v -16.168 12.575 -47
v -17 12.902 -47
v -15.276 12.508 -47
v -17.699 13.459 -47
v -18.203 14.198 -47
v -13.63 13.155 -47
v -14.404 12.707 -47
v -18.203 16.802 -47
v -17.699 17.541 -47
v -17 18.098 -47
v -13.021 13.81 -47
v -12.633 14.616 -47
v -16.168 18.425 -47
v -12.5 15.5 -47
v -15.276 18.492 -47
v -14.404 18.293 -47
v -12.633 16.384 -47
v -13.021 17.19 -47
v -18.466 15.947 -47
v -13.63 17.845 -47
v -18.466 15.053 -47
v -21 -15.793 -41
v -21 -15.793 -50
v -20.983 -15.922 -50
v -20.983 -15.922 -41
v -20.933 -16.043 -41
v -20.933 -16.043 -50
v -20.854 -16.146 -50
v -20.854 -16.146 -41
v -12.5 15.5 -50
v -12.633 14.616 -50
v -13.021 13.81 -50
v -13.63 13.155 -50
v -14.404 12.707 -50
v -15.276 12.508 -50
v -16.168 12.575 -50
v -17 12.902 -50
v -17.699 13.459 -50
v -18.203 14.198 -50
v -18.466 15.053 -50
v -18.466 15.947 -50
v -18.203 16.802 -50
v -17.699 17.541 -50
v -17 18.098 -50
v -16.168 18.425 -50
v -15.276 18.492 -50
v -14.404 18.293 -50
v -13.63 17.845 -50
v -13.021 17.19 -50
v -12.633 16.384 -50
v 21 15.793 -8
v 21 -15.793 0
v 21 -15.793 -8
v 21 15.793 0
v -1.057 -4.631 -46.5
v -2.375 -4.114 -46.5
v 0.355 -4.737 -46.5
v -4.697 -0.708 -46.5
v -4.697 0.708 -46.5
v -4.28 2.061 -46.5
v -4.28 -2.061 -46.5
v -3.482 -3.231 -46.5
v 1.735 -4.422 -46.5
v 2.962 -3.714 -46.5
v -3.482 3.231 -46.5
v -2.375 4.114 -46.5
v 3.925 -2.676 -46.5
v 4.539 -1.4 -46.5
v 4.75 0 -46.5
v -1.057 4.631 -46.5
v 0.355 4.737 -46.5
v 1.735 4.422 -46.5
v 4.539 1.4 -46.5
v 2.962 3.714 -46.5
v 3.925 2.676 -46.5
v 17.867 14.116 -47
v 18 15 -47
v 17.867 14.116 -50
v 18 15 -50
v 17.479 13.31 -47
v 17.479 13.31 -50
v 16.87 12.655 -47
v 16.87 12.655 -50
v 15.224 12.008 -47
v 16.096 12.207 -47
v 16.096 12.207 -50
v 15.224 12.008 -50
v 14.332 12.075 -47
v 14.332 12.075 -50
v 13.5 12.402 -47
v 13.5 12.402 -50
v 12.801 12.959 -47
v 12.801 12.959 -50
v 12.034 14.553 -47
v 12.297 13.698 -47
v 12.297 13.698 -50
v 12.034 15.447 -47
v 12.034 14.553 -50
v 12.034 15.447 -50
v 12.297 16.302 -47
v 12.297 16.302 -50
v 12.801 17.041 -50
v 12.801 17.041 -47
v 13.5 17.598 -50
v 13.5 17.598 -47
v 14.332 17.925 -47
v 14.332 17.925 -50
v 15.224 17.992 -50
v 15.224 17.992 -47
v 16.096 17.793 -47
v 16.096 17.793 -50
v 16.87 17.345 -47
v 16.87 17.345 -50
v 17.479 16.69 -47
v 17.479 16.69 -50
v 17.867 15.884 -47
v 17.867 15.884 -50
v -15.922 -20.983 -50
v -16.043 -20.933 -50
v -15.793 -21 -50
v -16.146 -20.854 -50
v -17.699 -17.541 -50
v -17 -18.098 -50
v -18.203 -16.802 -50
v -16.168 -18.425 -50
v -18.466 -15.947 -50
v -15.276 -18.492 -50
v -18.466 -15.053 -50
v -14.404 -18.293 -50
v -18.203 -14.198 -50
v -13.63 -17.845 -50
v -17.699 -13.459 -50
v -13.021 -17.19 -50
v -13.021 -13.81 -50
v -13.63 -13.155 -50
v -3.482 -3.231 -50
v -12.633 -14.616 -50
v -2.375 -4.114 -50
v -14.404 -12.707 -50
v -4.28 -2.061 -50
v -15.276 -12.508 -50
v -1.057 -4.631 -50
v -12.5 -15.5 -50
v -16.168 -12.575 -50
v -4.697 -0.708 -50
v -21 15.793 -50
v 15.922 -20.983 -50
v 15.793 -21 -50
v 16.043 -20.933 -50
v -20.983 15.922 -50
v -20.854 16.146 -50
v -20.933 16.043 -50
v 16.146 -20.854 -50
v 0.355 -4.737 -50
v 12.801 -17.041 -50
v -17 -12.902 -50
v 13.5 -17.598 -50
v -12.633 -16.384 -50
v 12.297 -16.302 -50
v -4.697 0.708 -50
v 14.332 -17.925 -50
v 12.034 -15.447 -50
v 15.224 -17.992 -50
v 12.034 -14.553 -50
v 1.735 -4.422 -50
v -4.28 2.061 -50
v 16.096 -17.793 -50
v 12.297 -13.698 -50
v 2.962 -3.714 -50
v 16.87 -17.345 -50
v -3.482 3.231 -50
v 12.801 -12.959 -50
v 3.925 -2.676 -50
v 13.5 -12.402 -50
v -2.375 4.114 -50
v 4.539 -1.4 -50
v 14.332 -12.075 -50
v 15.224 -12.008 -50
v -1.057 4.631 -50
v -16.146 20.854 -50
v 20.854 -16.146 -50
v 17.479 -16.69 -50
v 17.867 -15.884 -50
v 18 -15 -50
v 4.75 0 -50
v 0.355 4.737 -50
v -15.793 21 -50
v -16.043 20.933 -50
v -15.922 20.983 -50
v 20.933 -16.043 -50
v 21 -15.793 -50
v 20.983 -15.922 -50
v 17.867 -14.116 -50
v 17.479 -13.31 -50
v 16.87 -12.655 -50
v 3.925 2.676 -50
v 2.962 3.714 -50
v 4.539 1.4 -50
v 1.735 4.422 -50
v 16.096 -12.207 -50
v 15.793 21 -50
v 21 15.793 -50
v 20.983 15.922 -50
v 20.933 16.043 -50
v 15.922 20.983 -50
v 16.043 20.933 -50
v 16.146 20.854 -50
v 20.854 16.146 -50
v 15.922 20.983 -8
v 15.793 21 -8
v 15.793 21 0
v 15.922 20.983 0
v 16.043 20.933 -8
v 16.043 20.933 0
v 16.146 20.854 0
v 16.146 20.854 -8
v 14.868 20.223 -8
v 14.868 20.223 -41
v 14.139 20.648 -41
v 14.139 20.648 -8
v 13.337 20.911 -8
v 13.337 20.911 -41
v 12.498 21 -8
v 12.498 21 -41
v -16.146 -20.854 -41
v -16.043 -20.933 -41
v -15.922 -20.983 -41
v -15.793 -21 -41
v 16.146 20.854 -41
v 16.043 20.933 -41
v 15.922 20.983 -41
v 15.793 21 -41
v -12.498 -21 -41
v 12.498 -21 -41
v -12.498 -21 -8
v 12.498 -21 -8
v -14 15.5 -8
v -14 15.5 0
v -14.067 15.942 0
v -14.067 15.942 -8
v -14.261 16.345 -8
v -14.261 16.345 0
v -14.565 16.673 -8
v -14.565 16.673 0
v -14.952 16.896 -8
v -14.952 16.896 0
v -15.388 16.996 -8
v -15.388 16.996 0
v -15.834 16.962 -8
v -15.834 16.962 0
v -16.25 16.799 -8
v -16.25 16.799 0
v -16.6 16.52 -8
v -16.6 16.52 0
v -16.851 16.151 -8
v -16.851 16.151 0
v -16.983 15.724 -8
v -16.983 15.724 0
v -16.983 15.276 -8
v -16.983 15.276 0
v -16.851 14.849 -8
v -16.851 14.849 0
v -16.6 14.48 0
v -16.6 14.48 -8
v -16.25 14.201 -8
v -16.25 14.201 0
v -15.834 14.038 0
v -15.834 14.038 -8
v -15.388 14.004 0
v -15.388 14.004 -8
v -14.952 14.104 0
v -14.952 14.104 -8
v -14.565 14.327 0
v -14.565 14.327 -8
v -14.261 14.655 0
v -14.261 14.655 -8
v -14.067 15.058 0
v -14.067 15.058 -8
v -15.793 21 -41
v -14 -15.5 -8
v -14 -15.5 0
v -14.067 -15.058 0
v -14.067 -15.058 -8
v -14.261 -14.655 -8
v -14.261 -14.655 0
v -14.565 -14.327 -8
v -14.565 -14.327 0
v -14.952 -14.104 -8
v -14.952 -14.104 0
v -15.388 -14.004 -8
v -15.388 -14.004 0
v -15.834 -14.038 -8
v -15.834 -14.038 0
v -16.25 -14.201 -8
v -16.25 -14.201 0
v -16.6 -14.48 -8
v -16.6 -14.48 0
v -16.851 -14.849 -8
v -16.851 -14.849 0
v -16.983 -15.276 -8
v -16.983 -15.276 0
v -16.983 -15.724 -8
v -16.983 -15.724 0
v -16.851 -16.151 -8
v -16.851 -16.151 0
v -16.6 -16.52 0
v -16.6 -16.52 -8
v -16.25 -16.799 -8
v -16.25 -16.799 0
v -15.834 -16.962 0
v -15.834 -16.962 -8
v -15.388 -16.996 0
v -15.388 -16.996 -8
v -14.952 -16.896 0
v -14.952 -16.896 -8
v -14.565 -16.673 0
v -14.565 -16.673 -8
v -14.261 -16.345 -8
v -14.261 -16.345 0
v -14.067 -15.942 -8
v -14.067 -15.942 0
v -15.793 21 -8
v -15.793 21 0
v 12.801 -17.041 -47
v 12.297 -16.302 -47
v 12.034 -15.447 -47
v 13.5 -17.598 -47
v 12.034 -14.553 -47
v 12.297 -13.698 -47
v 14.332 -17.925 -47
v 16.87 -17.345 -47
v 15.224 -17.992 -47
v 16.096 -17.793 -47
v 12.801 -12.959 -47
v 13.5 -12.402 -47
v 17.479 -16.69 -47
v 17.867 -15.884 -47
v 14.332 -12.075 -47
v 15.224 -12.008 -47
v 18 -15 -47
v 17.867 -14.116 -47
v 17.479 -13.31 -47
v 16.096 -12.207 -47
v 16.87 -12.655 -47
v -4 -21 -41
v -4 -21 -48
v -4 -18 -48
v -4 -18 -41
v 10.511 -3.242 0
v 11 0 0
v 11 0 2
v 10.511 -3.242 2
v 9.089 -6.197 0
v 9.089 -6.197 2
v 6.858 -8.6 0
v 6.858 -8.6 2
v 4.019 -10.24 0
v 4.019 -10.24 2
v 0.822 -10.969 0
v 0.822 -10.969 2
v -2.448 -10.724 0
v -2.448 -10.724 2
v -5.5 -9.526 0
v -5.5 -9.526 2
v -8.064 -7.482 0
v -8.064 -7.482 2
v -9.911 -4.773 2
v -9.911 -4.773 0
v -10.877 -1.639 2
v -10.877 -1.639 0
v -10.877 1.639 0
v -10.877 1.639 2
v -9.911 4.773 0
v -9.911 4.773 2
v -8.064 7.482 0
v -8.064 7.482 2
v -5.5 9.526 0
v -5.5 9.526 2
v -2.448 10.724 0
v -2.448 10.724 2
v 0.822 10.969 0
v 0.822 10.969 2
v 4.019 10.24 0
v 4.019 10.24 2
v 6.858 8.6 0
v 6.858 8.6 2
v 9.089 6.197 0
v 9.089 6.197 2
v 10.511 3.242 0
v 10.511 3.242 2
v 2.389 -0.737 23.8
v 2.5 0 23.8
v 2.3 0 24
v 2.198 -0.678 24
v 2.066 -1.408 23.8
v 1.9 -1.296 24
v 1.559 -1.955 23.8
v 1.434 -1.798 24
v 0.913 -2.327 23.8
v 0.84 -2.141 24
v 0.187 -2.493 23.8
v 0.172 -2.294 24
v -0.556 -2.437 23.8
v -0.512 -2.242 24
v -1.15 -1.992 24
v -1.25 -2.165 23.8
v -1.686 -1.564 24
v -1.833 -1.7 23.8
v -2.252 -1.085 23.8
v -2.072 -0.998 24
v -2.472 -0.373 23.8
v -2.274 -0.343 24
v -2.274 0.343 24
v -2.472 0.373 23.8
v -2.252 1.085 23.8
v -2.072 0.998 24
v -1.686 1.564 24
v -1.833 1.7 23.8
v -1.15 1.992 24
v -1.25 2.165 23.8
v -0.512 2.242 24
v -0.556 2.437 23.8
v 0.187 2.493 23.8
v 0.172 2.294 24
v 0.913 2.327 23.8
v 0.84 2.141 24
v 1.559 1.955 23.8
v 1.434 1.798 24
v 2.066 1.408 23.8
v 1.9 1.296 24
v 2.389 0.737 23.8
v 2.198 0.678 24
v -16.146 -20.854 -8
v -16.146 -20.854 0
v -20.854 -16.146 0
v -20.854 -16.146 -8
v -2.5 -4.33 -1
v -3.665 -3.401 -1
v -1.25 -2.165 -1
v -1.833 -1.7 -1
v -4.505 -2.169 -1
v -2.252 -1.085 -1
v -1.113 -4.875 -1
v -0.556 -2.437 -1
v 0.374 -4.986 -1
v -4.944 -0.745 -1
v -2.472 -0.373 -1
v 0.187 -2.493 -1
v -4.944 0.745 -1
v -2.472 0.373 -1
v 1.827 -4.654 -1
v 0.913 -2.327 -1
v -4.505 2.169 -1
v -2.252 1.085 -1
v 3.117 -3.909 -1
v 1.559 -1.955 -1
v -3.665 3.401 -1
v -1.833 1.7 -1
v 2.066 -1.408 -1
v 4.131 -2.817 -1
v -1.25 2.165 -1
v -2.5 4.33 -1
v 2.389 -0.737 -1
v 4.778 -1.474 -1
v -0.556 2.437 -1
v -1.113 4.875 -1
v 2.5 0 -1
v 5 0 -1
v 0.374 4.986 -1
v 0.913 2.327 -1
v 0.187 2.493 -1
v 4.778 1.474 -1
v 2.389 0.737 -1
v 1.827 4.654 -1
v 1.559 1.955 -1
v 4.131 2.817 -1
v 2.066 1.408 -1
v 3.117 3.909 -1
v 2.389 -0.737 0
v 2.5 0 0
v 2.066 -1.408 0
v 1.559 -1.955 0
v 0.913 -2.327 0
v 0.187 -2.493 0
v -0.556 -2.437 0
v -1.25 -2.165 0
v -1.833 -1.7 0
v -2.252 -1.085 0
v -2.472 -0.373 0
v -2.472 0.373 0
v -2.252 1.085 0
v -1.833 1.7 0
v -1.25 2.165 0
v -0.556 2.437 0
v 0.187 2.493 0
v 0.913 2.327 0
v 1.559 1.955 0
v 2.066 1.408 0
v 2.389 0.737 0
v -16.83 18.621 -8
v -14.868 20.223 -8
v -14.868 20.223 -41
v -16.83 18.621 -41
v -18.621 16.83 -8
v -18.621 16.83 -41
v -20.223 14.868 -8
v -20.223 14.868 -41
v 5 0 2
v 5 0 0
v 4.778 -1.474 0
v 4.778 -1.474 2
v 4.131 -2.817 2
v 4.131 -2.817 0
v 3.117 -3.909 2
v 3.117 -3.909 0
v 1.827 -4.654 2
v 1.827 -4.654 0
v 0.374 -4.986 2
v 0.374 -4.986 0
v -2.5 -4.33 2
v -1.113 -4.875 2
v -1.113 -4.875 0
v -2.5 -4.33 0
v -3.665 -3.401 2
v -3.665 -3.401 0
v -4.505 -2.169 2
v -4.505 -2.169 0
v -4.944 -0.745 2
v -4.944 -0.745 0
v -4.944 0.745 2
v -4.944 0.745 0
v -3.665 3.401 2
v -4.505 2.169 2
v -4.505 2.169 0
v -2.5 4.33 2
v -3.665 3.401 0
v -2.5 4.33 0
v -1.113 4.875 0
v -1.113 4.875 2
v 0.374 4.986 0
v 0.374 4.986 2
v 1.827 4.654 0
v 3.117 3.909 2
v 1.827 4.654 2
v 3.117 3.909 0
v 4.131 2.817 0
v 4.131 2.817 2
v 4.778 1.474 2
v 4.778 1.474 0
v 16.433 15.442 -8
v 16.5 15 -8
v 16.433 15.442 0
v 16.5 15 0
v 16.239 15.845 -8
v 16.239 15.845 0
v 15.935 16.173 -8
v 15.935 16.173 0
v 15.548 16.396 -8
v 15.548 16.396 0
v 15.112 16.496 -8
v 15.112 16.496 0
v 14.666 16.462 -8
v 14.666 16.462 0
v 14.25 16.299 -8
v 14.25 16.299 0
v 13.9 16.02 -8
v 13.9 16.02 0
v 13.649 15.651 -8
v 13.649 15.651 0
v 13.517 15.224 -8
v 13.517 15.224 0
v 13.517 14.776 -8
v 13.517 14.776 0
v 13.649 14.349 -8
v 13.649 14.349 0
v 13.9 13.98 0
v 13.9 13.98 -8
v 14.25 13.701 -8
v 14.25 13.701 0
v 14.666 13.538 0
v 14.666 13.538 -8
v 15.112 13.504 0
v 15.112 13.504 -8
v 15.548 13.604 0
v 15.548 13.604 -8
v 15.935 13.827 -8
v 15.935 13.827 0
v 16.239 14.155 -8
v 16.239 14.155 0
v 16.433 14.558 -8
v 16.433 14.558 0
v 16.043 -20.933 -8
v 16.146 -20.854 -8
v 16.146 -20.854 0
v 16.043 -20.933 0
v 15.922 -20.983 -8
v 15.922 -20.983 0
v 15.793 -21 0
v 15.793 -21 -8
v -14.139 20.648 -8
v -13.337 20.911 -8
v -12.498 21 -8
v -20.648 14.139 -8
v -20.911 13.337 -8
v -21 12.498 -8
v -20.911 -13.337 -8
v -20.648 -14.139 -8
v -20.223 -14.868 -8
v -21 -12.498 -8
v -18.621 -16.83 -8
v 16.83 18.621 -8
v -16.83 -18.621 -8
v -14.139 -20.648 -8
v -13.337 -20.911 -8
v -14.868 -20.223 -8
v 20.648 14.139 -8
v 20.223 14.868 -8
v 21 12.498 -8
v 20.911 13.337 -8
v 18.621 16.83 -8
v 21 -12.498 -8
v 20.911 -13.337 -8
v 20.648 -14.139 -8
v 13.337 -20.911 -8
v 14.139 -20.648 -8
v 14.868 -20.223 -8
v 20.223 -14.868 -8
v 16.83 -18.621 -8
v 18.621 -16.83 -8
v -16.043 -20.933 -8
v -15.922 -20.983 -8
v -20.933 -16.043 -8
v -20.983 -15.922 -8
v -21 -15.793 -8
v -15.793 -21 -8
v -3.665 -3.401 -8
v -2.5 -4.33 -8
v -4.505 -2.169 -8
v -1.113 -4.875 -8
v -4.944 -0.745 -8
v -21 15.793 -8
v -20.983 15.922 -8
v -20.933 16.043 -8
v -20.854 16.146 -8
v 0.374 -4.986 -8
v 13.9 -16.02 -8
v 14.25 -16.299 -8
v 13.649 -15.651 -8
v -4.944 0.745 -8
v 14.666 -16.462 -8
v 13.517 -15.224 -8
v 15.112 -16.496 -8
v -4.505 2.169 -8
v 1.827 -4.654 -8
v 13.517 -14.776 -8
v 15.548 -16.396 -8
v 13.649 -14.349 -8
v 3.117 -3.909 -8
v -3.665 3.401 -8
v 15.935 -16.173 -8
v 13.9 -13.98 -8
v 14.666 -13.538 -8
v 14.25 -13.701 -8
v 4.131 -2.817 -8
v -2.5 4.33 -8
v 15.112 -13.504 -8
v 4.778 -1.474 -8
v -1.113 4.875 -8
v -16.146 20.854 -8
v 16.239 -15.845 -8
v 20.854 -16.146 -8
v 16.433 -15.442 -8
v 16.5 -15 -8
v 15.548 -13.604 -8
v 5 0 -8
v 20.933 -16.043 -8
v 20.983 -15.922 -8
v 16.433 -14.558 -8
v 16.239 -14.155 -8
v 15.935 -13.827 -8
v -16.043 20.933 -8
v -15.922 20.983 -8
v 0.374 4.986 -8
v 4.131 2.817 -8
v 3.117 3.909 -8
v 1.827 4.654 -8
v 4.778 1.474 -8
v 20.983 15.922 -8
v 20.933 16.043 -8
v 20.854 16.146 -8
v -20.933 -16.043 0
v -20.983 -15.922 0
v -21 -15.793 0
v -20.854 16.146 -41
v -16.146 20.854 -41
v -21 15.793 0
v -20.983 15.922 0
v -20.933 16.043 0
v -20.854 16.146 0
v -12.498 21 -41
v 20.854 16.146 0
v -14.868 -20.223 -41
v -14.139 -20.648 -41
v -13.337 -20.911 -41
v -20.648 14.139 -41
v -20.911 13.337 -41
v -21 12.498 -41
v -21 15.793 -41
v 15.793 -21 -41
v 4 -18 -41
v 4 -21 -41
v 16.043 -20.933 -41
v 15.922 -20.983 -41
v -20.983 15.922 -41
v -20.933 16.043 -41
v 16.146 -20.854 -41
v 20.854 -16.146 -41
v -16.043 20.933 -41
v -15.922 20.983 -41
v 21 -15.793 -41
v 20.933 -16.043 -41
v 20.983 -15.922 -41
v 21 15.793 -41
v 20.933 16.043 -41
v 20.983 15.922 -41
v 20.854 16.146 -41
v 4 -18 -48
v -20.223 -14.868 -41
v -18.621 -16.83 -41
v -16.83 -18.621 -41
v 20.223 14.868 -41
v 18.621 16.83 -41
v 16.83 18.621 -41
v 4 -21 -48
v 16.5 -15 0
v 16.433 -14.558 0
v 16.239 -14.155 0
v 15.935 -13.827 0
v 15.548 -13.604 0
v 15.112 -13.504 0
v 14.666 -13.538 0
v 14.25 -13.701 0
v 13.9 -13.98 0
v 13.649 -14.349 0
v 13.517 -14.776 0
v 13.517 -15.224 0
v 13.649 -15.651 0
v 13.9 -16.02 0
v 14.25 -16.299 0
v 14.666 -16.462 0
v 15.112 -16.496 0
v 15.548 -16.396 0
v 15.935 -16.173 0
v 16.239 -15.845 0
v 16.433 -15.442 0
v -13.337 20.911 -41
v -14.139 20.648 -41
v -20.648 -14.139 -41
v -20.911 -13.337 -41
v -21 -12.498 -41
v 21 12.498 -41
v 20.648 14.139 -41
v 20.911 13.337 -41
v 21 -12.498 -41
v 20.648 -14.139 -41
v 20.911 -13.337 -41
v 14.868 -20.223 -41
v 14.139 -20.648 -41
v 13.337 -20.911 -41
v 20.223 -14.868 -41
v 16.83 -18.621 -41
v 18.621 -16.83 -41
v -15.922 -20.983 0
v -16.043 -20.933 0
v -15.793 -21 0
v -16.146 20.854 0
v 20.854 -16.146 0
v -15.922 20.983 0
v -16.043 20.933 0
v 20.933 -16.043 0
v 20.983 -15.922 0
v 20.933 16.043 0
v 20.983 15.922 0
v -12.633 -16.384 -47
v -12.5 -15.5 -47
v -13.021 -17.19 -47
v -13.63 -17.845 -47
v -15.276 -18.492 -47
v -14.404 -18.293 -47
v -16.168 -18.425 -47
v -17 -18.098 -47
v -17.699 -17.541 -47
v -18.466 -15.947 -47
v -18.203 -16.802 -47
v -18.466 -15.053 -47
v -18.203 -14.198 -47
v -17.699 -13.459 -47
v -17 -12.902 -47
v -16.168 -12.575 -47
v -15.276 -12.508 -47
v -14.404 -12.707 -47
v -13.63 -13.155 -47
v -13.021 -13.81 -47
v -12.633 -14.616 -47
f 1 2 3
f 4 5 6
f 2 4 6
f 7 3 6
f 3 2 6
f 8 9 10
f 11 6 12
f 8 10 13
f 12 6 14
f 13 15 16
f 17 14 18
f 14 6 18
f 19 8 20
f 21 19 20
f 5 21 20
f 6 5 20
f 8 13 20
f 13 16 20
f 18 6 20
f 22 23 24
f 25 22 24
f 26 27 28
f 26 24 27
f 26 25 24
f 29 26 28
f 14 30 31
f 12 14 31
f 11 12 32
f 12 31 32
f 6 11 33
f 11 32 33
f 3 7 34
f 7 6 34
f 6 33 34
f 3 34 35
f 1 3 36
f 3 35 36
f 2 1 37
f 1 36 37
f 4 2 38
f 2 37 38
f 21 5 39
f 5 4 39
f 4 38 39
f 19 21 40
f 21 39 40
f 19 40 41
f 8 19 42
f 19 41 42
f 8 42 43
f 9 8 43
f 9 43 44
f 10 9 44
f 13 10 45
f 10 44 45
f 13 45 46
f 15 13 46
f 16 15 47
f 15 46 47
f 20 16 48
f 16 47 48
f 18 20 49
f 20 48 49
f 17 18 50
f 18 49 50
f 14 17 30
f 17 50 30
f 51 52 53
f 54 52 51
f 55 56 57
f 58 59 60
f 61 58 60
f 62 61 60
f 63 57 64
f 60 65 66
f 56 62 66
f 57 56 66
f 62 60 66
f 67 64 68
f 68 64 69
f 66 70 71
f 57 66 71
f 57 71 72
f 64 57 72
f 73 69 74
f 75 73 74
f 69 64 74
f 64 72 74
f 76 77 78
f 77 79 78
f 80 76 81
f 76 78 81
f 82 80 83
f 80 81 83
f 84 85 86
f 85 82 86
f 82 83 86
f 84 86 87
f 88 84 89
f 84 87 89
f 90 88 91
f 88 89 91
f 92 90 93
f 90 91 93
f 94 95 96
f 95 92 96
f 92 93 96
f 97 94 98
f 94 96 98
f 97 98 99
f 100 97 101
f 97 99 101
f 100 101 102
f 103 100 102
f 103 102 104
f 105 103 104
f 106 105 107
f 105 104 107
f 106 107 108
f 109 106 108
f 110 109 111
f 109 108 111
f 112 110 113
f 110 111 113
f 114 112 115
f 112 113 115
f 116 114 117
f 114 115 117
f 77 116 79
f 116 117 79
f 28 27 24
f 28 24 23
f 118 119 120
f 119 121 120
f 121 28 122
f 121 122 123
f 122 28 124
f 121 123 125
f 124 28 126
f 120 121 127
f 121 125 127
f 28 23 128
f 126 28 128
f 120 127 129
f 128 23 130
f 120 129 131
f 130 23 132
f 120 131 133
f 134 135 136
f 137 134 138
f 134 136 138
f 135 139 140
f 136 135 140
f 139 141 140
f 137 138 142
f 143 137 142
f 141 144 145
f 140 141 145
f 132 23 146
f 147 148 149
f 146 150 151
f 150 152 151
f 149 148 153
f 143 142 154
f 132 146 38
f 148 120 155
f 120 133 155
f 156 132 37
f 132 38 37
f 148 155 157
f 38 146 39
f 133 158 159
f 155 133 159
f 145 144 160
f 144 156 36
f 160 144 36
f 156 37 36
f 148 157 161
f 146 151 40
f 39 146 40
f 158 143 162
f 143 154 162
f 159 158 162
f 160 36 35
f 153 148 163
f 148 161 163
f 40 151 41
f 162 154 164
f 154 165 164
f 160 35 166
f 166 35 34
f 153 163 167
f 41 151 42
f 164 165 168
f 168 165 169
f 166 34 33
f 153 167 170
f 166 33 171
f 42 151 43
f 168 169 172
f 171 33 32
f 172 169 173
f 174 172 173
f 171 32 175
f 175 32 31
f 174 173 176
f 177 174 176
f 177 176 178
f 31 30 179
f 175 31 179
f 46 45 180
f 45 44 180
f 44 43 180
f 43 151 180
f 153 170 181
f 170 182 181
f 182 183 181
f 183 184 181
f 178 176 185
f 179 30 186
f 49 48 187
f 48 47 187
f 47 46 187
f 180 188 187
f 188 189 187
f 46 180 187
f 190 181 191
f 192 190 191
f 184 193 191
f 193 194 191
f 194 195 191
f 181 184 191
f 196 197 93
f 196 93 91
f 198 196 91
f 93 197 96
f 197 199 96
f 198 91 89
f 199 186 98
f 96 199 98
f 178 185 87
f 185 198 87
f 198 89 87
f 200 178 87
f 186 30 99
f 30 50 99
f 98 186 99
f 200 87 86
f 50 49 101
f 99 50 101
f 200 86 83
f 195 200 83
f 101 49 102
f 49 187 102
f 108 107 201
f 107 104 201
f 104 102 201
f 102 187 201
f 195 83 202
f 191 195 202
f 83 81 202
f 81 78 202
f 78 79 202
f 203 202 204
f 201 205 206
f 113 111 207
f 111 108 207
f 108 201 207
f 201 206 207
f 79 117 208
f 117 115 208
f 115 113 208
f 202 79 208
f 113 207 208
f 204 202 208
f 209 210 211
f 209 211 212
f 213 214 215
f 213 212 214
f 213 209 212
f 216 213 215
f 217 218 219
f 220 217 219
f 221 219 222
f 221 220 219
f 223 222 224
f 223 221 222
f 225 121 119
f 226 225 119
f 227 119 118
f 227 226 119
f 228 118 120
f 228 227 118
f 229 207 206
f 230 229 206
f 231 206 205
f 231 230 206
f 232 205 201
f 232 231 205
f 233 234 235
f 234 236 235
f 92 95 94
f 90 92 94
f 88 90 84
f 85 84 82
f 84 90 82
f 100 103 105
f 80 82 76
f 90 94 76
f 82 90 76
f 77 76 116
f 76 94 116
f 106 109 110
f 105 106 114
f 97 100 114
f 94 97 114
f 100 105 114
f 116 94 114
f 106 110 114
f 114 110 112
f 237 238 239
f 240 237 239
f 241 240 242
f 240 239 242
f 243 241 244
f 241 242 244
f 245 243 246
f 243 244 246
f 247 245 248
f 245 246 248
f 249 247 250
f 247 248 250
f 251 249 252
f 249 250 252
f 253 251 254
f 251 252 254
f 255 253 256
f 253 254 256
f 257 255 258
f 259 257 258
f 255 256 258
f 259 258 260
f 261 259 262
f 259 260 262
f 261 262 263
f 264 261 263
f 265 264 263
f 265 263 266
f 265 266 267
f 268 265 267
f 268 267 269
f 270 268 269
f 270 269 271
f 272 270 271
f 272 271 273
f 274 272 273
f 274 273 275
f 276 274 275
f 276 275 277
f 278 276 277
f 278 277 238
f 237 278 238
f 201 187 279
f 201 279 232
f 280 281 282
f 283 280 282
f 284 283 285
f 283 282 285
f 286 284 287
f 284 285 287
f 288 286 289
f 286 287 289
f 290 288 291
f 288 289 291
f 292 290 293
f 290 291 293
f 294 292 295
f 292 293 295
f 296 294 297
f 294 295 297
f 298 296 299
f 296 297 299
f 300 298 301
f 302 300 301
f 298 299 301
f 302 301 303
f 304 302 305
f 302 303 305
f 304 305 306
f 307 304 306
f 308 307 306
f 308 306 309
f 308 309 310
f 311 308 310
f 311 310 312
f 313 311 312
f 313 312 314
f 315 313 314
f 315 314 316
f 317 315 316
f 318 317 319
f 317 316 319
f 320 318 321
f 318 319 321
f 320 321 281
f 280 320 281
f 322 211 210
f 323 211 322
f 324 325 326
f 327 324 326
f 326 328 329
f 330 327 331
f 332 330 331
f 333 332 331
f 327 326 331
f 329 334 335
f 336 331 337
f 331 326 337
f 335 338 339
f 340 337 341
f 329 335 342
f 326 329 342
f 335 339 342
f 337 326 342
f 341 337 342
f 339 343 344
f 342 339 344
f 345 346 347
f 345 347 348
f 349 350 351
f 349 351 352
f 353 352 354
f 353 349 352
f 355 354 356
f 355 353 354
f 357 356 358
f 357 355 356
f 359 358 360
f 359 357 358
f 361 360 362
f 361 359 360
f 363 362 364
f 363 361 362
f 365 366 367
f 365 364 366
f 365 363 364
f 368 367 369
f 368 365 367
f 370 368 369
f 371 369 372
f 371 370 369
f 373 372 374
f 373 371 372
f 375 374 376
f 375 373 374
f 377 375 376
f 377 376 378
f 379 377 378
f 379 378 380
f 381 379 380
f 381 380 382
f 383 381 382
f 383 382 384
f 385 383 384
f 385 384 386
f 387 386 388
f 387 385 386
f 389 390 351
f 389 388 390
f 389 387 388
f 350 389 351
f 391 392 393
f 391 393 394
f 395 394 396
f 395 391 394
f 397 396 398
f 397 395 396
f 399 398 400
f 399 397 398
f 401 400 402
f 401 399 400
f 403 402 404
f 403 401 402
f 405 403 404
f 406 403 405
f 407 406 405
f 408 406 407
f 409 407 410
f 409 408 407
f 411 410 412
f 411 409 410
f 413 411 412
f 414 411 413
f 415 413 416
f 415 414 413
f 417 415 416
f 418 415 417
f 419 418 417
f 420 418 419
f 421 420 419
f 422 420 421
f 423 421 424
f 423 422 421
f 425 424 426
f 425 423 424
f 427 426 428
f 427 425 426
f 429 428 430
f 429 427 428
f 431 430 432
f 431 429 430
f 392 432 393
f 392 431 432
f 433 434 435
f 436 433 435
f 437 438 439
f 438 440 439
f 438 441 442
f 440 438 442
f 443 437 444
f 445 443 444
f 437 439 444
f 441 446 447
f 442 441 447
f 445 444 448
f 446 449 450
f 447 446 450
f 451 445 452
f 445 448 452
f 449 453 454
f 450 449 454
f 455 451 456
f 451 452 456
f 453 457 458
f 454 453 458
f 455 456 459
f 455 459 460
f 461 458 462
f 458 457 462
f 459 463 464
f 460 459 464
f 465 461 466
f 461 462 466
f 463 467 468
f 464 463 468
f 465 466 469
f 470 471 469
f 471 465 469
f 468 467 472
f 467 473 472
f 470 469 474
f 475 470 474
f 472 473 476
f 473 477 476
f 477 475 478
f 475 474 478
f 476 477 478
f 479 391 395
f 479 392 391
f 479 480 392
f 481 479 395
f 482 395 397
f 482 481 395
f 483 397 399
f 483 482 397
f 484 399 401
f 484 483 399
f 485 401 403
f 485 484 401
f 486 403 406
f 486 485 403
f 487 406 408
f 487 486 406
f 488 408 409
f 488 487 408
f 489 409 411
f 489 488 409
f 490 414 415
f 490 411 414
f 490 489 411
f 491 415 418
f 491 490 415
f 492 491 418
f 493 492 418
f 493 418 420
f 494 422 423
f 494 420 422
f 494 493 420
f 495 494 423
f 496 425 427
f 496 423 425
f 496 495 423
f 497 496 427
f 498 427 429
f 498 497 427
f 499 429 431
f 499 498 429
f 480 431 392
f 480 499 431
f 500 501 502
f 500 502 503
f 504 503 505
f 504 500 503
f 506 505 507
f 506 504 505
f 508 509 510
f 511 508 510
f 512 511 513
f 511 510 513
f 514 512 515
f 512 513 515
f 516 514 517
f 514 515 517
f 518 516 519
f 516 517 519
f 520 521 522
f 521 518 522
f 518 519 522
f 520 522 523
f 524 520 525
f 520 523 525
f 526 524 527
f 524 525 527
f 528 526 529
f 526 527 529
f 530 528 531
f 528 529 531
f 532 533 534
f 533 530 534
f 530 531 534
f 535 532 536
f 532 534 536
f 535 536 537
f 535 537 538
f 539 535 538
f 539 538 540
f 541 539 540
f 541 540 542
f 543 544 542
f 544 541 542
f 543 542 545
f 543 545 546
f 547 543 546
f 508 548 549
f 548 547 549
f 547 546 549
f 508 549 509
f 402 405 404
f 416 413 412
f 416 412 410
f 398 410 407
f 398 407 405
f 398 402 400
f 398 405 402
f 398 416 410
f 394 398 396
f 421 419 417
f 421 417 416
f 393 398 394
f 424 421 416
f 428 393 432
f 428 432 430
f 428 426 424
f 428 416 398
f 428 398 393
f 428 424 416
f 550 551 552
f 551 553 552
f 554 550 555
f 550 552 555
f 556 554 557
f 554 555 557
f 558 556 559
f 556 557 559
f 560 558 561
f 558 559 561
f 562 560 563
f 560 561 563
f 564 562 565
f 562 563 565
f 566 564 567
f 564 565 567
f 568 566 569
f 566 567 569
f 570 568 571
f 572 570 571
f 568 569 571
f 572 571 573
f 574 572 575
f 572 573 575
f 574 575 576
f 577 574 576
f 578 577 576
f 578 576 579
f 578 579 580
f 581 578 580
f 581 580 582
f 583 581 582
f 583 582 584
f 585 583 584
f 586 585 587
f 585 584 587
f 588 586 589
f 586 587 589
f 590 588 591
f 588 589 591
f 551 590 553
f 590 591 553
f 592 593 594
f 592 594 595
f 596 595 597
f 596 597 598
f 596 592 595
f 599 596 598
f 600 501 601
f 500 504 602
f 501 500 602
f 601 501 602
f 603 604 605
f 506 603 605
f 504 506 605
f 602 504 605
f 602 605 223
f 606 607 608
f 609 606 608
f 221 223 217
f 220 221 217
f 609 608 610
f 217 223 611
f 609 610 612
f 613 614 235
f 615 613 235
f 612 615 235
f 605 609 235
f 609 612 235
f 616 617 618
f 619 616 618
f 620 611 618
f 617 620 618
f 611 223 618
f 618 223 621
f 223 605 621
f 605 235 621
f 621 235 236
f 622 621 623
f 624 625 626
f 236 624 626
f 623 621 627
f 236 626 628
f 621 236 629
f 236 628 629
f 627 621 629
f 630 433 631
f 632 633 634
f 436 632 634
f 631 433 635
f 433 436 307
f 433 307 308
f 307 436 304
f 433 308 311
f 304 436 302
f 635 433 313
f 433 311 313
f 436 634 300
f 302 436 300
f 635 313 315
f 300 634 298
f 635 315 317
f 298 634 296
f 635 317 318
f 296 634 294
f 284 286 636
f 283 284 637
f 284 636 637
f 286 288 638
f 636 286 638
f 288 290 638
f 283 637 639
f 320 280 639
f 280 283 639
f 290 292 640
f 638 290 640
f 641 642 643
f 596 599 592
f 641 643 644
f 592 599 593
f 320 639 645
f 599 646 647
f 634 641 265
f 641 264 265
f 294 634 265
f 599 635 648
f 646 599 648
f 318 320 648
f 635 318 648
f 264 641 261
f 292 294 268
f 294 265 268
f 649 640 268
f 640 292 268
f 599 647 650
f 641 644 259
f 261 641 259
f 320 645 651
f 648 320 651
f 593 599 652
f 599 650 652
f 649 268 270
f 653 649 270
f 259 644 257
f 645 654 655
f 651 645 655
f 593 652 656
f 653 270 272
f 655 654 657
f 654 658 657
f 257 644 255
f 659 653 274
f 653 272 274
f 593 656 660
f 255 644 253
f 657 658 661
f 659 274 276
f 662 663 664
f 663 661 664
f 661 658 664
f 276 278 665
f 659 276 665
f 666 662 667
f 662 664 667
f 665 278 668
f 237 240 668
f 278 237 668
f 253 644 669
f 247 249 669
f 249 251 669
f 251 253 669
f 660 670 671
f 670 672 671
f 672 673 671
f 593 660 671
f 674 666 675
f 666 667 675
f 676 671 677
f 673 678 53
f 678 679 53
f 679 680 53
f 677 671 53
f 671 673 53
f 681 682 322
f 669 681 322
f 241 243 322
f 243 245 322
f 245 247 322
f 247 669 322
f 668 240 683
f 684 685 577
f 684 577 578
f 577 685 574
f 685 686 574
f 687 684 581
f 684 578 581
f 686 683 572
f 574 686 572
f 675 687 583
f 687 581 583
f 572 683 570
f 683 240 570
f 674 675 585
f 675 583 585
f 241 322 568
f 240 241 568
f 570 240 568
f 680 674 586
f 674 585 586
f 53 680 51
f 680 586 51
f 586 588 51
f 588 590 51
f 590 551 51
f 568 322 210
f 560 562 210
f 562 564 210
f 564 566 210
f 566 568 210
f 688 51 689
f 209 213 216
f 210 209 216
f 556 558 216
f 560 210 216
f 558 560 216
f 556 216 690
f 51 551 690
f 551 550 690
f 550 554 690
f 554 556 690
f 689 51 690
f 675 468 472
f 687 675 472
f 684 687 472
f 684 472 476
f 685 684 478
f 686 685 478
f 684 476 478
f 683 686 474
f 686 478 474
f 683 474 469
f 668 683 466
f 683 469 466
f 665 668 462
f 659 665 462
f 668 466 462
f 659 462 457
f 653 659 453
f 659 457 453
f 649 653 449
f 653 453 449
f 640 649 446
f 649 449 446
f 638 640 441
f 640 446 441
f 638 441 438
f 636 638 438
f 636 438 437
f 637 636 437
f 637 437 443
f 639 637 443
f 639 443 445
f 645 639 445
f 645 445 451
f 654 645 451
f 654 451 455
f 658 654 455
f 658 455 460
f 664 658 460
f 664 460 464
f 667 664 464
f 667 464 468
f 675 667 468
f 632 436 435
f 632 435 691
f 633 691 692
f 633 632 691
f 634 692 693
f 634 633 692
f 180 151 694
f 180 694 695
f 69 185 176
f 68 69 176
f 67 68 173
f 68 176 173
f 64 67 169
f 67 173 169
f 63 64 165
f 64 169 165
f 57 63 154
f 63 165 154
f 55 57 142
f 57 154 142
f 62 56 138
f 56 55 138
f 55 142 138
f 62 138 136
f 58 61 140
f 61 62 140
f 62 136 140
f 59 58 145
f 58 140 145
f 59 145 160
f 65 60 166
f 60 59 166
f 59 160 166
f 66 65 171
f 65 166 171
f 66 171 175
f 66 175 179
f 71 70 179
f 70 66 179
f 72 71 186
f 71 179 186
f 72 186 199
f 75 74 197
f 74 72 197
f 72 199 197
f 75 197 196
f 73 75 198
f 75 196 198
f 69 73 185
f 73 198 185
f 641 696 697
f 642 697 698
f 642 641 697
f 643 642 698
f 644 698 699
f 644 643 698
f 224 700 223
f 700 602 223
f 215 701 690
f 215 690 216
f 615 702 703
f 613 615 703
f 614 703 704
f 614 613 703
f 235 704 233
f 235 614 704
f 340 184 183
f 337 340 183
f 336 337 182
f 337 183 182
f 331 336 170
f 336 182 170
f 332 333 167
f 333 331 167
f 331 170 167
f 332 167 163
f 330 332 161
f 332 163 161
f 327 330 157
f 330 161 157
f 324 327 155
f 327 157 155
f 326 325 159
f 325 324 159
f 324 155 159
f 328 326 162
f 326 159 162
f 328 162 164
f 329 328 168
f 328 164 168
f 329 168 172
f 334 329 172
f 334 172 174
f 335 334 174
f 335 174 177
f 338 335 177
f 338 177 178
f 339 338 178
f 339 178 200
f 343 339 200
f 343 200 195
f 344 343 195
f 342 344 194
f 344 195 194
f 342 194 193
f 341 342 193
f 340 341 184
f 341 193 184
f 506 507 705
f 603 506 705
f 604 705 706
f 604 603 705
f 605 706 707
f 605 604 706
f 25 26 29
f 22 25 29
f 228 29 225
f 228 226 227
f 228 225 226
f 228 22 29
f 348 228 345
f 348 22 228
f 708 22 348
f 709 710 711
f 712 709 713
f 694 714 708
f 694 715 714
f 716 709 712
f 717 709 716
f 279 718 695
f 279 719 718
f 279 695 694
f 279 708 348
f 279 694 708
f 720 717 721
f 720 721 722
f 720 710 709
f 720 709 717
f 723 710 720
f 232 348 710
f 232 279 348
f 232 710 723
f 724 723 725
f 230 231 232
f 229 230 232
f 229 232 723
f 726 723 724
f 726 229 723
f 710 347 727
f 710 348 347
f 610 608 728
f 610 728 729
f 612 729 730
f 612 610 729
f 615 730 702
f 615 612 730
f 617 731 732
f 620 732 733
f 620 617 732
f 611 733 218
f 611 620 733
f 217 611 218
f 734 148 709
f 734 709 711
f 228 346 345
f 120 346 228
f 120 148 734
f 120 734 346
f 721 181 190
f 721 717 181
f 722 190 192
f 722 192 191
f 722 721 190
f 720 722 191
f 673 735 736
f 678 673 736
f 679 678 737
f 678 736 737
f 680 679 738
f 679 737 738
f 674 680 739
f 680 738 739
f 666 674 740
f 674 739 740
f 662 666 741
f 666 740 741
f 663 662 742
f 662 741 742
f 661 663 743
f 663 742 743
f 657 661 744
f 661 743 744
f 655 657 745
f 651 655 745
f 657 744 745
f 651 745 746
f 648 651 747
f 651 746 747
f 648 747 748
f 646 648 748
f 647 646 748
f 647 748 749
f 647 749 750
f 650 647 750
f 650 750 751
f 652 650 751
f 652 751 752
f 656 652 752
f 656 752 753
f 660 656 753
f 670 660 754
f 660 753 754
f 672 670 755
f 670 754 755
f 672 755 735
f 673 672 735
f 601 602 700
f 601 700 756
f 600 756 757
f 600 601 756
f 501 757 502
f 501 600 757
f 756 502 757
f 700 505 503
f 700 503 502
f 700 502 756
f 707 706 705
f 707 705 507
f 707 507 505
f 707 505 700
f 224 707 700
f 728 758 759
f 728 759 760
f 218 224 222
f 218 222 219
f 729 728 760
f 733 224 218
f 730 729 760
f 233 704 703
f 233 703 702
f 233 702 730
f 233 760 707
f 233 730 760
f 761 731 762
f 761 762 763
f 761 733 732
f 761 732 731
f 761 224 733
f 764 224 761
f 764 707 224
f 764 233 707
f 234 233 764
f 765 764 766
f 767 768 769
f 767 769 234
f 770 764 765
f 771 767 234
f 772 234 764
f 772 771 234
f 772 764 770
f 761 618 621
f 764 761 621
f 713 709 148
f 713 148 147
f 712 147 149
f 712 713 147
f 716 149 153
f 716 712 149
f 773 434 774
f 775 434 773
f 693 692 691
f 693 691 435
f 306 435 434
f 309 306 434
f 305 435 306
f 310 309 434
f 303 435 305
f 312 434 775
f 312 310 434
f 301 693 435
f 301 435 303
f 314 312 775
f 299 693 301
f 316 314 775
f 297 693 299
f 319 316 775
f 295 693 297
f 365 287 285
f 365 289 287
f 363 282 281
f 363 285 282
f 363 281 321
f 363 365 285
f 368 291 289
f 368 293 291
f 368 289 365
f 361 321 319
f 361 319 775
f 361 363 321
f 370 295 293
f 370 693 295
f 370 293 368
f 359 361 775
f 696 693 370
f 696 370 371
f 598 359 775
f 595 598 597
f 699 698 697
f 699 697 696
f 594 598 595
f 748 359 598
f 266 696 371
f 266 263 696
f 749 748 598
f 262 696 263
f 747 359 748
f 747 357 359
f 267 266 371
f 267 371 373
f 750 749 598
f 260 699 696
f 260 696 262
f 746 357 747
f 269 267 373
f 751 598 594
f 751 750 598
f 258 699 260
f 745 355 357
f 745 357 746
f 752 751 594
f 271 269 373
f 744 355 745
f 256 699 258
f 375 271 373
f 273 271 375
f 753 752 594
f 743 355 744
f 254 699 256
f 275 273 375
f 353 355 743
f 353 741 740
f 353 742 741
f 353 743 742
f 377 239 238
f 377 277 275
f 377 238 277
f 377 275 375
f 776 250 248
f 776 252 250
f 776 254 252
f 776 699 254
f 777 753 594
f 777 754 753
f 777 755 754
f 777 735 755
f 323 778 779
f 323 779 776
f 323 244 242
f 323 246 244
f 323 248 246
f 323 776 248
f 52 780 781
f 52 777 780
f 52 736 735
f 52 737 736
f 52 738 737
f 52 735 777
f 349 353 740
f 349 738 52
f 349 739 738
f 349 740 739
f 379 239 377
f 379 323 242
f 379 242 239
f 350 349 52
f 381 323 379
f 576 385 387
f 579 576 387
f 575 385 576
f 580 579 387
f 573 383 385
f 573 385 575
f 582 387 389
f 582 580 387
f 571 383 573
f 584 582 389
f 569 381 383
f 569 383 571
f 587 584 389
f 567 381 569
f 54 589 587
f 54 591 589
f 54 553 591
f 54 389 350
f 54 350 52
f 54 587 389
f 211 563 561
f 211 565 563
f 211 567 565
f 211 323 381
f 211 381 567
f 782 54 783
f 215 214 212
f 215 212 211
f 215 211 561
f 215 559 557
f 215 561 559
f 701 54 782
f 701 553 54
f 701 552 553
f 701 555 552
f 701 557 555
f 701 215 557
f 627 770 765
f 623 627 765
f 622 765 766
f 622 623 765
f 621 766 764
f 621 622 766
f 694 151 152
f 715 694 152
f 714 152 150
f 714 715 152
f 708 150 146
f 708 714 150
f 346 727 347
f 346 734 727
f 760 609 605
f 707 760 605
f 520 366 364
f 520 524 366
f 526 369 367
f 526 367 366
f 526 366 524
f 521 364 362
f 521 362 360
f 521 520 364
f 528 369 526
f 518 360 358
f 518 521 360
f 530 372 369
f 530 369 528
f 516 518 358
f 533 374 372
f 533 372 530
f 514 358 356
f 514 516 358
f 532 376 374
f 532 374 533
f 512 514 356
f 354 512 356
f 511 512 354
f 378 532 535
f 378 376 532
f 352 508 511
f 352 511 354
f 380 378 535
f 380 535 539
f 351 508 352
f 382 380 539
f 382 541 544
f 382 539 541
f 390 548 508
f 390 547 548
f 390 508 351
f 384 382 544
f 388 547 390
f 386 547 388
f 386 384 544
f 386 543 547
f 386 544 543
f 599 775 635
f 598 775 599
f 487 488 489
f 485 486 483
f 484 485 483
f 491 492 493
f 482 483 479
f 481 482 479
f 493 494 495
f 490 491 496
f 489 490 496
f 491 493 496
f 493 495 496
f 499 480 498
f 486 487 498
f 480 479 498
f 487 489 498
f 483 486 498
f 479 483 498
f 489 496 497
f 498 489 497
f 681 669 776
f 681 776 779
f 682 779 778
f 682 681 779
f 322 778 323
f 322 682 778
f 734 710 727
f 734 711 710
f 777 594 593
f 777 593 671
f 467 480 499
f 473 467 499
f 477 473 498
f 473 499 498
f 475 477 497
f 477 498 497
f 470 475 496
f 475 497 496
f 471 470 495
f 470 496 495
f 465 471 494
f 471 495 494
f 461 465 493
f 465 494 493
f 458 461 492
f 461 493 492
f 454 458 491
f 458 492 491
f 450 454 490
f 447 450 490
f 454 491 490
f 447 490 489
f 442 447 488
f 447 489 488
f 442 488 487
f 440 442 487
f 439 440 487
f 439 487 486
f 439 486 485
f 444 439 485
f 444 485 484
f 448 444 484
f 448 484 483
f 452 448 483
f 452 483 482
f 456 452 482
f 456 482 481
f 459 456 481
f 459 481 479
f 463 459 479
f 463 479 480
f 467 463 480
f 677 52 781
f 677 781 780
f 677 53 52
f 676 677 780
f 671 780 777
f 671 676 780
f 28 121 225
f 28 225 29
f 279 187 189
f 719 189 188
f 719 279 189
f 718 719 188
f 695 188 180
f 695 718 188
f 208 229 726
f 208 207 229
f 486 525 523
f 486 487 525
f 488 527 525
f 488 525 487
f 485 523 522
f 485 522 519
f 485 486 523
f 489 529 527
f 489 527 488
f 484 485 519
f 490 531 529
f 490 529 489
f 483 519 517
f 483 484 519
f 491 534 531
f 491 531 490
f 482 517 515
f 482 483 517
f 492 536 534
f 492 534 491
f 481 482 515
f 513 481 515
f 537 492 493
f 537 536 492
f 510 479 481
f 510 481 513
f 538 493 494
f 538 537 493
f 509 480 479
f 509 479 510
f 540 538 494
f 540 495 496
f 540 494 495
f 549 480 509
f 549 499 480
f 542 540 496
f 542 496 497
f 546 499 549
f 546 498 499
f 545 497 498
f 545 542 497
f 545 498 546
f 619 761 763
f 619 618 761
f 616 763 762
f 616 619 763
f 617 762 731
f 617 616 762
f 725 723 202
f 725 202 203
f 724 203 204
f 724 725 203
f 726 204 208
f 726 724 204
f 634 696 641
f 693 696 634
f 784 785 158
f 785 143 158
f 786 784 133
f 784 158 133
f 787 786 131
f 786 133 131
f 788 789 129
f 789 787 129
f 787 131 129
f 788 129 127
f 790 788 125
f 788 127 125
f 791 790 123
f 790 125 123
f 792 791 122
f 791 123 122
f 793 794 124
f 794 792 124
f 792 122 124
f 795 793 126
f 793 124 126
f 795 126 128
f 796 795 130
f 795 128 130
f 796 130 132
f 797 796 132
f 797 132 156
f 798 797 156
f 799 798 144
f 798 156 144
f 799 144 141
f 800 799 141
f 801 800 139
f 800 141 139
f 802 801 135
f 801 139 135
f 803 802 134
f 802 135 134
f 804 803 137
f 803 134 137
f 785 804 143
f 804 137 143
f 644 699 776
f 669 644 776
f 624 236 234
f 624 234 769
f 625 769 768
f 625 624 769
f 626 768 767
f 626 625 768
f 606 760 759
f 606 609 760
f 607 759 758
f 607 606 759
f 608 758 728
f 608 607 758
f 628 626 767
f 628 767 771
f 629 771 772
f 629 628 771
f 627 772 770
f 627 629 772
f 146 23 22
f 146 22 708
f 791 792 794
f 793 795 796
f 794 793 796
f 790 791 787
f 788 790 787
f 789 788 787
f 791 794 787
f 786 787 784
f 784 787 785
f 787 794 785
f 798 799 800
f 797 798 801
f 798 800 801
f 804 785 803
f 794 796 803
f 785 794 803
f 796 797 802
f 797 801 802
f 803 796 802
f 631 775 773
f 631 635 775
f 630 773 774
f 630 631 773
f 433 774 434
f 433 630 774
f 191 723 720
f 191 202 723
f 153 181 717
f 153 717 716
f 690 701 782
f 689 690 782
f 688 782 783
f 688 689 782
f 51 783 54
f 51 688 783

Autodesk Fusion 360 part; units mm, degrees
sketch "Sketch1" plane through (0, 0, 0) normal (0, 0, 1) x (1, 0, 0) in component "Component"
  line L0 (16, 21) -> (-16, 21)
  line L1 (-21, 16) -> (-21, -16)
  line L2 (-16, -21) -> (16, -21)
  line L3 (21, -16) -> (21, 16)
  line L4 (21, 21) -> (-21, -21) construction
  line L5 (-21, 21) -> (21, -21) construction
  line L6 (-15.6506, 22.8547) -> (-16, 22.8547)
  line L7 (-21, 16) -> (-16, 21)
  line L8 (21, 16) -> (16, 21)
  line L9 (-16, -21) -> (-21, -16)
  line L10 (16, -21) -> (21, -16)
  circle A0 centre (-15.5, 15.5) radius 1.5
  circle A1 centre (15, 15) radius 1.5
  circle A2 centre (15, -15) radius 1.5
  circle A3 centre (-15.5, -15.5) radius 1.5
  circle A4 centre (0, 0) radius 11
  circle A5 centre (0, 0) radius 5
  circle A6 centre (0, 0) radius 2.5
  dimension "d3" = 3
  dimension "d4" = 15.5
  dimension "d5" = 15.5
  dimension "d6" = 5
extrude "Extrude1" add sketch "Sketch1" along normal blind 2 contours A4 makes body 1 in component "Component"
extrude "Extrude2" add sketch "Sketch1" along normal blind 24 separate body contours A6 makes body 2 in component "Component"
extrude "Extrude3" add sketch "Sketch1" against normal blind 1 separate body contours A5 makes body 3 in component "Component"
extrude "Extrude4" add sketch "Sketch1" against normal blind 8 contours L0 L1 L2 L3 L7 L8 L9 L10 | A4 bodies 1 3 in component "Component"
sketch "Sketch2" plane through (0, 0, -8) normal (0, 0, -1) x (1, 0, 0) in component "Component"
  circle A0 centre (15, 15) radius 1.5
  circle A1 centre (15, -15) radius 1.5
  circle A2 centre (0, 0) radius 5
  circle A3 centre (-15.5, 15.5) radius 1.5
  circle A4 centre (-15.5, -15.5) radius 1.5
  line L0 (16, 21) -> (-16, 21)
  line L1 (-16, 21) -> (-21, 16)
  line L2 (-21, 16) -> (-21, -16)
  line L3 (-21, -16) -> (-16, -21)
  line L4 (-16, -21) -> (16, -21)
  line L5 (16, -21) -> (21, -16)
  line L6 (21, -16) -> (21, 16)
  line L7 (21, 16) -> (16, 21)
  line L8 (12.4984, 21) -> (-12.4984, 21)
  line L9 (-21, 12.4984) -> (-21, -12.4984)
  line L10 (-12.4984, -21) -> (12.4984, -21)
  line L11 (21, -12.4984) -> (21, 12.4984)
  line L12 (21, 21) -> (-21, -21) construction
  line L13 (-21, 21) -> (21, -21) construction
  arc A5 (-14.8678, 20.2227) -> (-20.2227, 14.8678) centre (0, 0) ccw
  arc A6 (20.2227, 14.8678) -> (14.8678, 20.2227) centre (0, 0) ccw
  arc A7 (-20.2227, -14.8678) -> (-14.8678, -20.2227) centre (0, 0) ccw
  arc A8 (14.8678, -20.2227) -> (21, -13.7481) centre (0, 0) ccw
  arc A9 (-12.4984, 21) -> (-14.8678, 20.2227) centre (-12.4984, 17) ccw
  arc A10 (-20.2227, 14.8678) -> (-21, 12.4984) centre (-17, 12.4984) ccw
  arc A11 (14.8678, 20.2227) -> (12.4984, 21) centre (12.4984, 17) ccw
  arc A12 (20.2227, -14.8678) -> (21, -12.4984) centre (17, -12.4984) ccw
  arc A13 (21, 12.4984) -> (20.2227, 14.8678) centre (17, 12.4984) ccw
  arc A14 (12.4984, -21) -> (14.8678, -20.2227) centre (12.4984, -17) ccw
  arc A15 (-14.8678, -20.2227) -> (-12.4984, -21) centre (-12.4984, -17) ccw
  arc A16 (-21, -12.4984) -> (-20.2227, -14.8678) centre (-17, -12.4984) ccw
  dimension "d15" = 42
  dimension "d16" = 42
  dimension "d17" = 50.2
  dimension "d18" = 4
  dimension "d19" = 4
  dimension "d20" = 4
  dimension "d21" = 4
  dimension "d22" = 4
  dimension "d23" = 4
  dimension "d24" = 4
  dimension "d25" = 4
extrude "Extrude5" add sketch "Sketch2" along normal blind 33 separate body contours A0 | A1 | A2 | A3 | A4 | L0 L2 L4 L6 L8 L9 L10 L11 A5 A6 A7 A8 A9 A10 A11 A12 A13 A14 A15 A16 makes body 4 in component "Component"
ref_plane "WorkPlane1" through (0, 0, -50) normal (0, 0, 1) x (1, 0, 0) in component "Component"
sketch "Sketch3" plane through (-15.5, 15.5, -50) normal (0, 0, 1) x (1, 0, 0) in component "Component"
  circle A0 centre (15.5, -15.5) radius 4.75
  line L0 (31.5, -36.5) -> (-0.5, -36.5)
  line L1 (-0.5, -36.5) -> (-5.5, -31.5)
  line L2 (-5.5, -31.5) -> (-5.5, 0.5)
  line L3 (-5.5, 0.5) -> (-0.5, 5.5)
  line L4 (-0.5, 5.5) -> (31.5, 5.5)
  line L5 (31.5, 5.5) -> (36.5, 0.5)
  line L6 (36.5, 0.5) -> (36.5, -31.5)
  line L7 (36.5, -31.5) -> (31.5, -36.5)
  circle A1 centre (30.5, -30.5) radius 3
  circle A2 centre (30.5, -0.5) radius 3
  circle A3 centre (0, -31) radius 3
  circle A4 centre (0, 0) radius 3
  dimension "d29" = 6
  dimension "d30" = 6
  dimension "d31" = 6
  dimension "d32" = 6
  dimension "d33" = 9.5
extrude "Extrude6" add sketch "Sketch3" along normal blind 9 separate body contours A0 | L0 L1 L2 L3 L4 L5 L6 L7 | A1 | A2 | A3 | A4 makes body 5 in component "Component"
extrude "Extrude8" cut sketch "Sketch3" along normal blind 3 contours A1 | A2 | A3 | A4 bodies 5 in component "Component"
extrude "Extrude9" cut sketch "Sketch3" along normal blind 3.5 contours A0 bodies 5 in component "Component"
chamfer "Chamfer1" distance 0.2 angle 45 1 edges at (-2.3308, -0.904, 24) on bodies 2 in component "Component"
fillet "Fillet1" radius 0.5 16 edges at (16, 21, -4) (21, 16, -4) (21, -16, -4) (16, -21, -4) (-16, -21, -4) (-21, -16, -4) (-21, 16, -4) (-16, 21, -4) (16, 21, -45.5) (21, 16, -45.5) (21, -16, -45.5) (16, -21, -45.5) (-21, -16, -45.5) (-16, -21, -45.5) (-16, 21, -45.5) (-21, 16, -45.5) on bodies 1 5 in component "Component"
sketch "Sketch4" plane through (0, -21, 0) normal (0, -1, 0) x (1, 0, 0) in component "Component"
  line L0 (-15.7929, -41) -> (-15.7929, -50)
  line L1 (-15.7929, -50) -> (15.7929, -50)
  line L2 (15.7929, -50) -> (15.7929, -41)
  line L3 (15.7929, -41) -> (-15.7929, -41)
  line L4 (-4, -41) -> (4, -41)
  line L5 (4, -41) -> (4, -48)
  line L6 (4, -48) -> (-4, -48)
  line L7 (-4, -48) -> (-4, -41)
  line L8 (0, -50) -> (0, -26) construction
  dimension "d53" = 8
  dimension "d54" = 7
  dimension "d55" = 4
extrude "Extrude10" cut sketch "Sketch4" against normal blind 3 contours L3 L4 L5 L6 L7 bodies 5 in component "Component"
thread "Thread1" thread length 5 thread offset 0 in component "Component"
thread "Thread2" thread length 5 thread offset 0 in component "Component"
component "Component" placed x (1, 0, 0) y (0, 1, 0) z (0, 0, 1) at (0, 0, 0)
equation "d4 = ( 31 / 2 ) * 1 mm"
equation "d5 = d4"
equation "d9 = AxleLength"
equation "d26 = MotorLength - BackCoverLength - FrontCoverLength"
equation "d34 = BackCoverLength"
equation "MotorLength = 50 mm"
equation "AxleLength = 24 mm"
equation "FrontCoverLength = 8 mm"
equation "BackCoverLength = 9 mm"
